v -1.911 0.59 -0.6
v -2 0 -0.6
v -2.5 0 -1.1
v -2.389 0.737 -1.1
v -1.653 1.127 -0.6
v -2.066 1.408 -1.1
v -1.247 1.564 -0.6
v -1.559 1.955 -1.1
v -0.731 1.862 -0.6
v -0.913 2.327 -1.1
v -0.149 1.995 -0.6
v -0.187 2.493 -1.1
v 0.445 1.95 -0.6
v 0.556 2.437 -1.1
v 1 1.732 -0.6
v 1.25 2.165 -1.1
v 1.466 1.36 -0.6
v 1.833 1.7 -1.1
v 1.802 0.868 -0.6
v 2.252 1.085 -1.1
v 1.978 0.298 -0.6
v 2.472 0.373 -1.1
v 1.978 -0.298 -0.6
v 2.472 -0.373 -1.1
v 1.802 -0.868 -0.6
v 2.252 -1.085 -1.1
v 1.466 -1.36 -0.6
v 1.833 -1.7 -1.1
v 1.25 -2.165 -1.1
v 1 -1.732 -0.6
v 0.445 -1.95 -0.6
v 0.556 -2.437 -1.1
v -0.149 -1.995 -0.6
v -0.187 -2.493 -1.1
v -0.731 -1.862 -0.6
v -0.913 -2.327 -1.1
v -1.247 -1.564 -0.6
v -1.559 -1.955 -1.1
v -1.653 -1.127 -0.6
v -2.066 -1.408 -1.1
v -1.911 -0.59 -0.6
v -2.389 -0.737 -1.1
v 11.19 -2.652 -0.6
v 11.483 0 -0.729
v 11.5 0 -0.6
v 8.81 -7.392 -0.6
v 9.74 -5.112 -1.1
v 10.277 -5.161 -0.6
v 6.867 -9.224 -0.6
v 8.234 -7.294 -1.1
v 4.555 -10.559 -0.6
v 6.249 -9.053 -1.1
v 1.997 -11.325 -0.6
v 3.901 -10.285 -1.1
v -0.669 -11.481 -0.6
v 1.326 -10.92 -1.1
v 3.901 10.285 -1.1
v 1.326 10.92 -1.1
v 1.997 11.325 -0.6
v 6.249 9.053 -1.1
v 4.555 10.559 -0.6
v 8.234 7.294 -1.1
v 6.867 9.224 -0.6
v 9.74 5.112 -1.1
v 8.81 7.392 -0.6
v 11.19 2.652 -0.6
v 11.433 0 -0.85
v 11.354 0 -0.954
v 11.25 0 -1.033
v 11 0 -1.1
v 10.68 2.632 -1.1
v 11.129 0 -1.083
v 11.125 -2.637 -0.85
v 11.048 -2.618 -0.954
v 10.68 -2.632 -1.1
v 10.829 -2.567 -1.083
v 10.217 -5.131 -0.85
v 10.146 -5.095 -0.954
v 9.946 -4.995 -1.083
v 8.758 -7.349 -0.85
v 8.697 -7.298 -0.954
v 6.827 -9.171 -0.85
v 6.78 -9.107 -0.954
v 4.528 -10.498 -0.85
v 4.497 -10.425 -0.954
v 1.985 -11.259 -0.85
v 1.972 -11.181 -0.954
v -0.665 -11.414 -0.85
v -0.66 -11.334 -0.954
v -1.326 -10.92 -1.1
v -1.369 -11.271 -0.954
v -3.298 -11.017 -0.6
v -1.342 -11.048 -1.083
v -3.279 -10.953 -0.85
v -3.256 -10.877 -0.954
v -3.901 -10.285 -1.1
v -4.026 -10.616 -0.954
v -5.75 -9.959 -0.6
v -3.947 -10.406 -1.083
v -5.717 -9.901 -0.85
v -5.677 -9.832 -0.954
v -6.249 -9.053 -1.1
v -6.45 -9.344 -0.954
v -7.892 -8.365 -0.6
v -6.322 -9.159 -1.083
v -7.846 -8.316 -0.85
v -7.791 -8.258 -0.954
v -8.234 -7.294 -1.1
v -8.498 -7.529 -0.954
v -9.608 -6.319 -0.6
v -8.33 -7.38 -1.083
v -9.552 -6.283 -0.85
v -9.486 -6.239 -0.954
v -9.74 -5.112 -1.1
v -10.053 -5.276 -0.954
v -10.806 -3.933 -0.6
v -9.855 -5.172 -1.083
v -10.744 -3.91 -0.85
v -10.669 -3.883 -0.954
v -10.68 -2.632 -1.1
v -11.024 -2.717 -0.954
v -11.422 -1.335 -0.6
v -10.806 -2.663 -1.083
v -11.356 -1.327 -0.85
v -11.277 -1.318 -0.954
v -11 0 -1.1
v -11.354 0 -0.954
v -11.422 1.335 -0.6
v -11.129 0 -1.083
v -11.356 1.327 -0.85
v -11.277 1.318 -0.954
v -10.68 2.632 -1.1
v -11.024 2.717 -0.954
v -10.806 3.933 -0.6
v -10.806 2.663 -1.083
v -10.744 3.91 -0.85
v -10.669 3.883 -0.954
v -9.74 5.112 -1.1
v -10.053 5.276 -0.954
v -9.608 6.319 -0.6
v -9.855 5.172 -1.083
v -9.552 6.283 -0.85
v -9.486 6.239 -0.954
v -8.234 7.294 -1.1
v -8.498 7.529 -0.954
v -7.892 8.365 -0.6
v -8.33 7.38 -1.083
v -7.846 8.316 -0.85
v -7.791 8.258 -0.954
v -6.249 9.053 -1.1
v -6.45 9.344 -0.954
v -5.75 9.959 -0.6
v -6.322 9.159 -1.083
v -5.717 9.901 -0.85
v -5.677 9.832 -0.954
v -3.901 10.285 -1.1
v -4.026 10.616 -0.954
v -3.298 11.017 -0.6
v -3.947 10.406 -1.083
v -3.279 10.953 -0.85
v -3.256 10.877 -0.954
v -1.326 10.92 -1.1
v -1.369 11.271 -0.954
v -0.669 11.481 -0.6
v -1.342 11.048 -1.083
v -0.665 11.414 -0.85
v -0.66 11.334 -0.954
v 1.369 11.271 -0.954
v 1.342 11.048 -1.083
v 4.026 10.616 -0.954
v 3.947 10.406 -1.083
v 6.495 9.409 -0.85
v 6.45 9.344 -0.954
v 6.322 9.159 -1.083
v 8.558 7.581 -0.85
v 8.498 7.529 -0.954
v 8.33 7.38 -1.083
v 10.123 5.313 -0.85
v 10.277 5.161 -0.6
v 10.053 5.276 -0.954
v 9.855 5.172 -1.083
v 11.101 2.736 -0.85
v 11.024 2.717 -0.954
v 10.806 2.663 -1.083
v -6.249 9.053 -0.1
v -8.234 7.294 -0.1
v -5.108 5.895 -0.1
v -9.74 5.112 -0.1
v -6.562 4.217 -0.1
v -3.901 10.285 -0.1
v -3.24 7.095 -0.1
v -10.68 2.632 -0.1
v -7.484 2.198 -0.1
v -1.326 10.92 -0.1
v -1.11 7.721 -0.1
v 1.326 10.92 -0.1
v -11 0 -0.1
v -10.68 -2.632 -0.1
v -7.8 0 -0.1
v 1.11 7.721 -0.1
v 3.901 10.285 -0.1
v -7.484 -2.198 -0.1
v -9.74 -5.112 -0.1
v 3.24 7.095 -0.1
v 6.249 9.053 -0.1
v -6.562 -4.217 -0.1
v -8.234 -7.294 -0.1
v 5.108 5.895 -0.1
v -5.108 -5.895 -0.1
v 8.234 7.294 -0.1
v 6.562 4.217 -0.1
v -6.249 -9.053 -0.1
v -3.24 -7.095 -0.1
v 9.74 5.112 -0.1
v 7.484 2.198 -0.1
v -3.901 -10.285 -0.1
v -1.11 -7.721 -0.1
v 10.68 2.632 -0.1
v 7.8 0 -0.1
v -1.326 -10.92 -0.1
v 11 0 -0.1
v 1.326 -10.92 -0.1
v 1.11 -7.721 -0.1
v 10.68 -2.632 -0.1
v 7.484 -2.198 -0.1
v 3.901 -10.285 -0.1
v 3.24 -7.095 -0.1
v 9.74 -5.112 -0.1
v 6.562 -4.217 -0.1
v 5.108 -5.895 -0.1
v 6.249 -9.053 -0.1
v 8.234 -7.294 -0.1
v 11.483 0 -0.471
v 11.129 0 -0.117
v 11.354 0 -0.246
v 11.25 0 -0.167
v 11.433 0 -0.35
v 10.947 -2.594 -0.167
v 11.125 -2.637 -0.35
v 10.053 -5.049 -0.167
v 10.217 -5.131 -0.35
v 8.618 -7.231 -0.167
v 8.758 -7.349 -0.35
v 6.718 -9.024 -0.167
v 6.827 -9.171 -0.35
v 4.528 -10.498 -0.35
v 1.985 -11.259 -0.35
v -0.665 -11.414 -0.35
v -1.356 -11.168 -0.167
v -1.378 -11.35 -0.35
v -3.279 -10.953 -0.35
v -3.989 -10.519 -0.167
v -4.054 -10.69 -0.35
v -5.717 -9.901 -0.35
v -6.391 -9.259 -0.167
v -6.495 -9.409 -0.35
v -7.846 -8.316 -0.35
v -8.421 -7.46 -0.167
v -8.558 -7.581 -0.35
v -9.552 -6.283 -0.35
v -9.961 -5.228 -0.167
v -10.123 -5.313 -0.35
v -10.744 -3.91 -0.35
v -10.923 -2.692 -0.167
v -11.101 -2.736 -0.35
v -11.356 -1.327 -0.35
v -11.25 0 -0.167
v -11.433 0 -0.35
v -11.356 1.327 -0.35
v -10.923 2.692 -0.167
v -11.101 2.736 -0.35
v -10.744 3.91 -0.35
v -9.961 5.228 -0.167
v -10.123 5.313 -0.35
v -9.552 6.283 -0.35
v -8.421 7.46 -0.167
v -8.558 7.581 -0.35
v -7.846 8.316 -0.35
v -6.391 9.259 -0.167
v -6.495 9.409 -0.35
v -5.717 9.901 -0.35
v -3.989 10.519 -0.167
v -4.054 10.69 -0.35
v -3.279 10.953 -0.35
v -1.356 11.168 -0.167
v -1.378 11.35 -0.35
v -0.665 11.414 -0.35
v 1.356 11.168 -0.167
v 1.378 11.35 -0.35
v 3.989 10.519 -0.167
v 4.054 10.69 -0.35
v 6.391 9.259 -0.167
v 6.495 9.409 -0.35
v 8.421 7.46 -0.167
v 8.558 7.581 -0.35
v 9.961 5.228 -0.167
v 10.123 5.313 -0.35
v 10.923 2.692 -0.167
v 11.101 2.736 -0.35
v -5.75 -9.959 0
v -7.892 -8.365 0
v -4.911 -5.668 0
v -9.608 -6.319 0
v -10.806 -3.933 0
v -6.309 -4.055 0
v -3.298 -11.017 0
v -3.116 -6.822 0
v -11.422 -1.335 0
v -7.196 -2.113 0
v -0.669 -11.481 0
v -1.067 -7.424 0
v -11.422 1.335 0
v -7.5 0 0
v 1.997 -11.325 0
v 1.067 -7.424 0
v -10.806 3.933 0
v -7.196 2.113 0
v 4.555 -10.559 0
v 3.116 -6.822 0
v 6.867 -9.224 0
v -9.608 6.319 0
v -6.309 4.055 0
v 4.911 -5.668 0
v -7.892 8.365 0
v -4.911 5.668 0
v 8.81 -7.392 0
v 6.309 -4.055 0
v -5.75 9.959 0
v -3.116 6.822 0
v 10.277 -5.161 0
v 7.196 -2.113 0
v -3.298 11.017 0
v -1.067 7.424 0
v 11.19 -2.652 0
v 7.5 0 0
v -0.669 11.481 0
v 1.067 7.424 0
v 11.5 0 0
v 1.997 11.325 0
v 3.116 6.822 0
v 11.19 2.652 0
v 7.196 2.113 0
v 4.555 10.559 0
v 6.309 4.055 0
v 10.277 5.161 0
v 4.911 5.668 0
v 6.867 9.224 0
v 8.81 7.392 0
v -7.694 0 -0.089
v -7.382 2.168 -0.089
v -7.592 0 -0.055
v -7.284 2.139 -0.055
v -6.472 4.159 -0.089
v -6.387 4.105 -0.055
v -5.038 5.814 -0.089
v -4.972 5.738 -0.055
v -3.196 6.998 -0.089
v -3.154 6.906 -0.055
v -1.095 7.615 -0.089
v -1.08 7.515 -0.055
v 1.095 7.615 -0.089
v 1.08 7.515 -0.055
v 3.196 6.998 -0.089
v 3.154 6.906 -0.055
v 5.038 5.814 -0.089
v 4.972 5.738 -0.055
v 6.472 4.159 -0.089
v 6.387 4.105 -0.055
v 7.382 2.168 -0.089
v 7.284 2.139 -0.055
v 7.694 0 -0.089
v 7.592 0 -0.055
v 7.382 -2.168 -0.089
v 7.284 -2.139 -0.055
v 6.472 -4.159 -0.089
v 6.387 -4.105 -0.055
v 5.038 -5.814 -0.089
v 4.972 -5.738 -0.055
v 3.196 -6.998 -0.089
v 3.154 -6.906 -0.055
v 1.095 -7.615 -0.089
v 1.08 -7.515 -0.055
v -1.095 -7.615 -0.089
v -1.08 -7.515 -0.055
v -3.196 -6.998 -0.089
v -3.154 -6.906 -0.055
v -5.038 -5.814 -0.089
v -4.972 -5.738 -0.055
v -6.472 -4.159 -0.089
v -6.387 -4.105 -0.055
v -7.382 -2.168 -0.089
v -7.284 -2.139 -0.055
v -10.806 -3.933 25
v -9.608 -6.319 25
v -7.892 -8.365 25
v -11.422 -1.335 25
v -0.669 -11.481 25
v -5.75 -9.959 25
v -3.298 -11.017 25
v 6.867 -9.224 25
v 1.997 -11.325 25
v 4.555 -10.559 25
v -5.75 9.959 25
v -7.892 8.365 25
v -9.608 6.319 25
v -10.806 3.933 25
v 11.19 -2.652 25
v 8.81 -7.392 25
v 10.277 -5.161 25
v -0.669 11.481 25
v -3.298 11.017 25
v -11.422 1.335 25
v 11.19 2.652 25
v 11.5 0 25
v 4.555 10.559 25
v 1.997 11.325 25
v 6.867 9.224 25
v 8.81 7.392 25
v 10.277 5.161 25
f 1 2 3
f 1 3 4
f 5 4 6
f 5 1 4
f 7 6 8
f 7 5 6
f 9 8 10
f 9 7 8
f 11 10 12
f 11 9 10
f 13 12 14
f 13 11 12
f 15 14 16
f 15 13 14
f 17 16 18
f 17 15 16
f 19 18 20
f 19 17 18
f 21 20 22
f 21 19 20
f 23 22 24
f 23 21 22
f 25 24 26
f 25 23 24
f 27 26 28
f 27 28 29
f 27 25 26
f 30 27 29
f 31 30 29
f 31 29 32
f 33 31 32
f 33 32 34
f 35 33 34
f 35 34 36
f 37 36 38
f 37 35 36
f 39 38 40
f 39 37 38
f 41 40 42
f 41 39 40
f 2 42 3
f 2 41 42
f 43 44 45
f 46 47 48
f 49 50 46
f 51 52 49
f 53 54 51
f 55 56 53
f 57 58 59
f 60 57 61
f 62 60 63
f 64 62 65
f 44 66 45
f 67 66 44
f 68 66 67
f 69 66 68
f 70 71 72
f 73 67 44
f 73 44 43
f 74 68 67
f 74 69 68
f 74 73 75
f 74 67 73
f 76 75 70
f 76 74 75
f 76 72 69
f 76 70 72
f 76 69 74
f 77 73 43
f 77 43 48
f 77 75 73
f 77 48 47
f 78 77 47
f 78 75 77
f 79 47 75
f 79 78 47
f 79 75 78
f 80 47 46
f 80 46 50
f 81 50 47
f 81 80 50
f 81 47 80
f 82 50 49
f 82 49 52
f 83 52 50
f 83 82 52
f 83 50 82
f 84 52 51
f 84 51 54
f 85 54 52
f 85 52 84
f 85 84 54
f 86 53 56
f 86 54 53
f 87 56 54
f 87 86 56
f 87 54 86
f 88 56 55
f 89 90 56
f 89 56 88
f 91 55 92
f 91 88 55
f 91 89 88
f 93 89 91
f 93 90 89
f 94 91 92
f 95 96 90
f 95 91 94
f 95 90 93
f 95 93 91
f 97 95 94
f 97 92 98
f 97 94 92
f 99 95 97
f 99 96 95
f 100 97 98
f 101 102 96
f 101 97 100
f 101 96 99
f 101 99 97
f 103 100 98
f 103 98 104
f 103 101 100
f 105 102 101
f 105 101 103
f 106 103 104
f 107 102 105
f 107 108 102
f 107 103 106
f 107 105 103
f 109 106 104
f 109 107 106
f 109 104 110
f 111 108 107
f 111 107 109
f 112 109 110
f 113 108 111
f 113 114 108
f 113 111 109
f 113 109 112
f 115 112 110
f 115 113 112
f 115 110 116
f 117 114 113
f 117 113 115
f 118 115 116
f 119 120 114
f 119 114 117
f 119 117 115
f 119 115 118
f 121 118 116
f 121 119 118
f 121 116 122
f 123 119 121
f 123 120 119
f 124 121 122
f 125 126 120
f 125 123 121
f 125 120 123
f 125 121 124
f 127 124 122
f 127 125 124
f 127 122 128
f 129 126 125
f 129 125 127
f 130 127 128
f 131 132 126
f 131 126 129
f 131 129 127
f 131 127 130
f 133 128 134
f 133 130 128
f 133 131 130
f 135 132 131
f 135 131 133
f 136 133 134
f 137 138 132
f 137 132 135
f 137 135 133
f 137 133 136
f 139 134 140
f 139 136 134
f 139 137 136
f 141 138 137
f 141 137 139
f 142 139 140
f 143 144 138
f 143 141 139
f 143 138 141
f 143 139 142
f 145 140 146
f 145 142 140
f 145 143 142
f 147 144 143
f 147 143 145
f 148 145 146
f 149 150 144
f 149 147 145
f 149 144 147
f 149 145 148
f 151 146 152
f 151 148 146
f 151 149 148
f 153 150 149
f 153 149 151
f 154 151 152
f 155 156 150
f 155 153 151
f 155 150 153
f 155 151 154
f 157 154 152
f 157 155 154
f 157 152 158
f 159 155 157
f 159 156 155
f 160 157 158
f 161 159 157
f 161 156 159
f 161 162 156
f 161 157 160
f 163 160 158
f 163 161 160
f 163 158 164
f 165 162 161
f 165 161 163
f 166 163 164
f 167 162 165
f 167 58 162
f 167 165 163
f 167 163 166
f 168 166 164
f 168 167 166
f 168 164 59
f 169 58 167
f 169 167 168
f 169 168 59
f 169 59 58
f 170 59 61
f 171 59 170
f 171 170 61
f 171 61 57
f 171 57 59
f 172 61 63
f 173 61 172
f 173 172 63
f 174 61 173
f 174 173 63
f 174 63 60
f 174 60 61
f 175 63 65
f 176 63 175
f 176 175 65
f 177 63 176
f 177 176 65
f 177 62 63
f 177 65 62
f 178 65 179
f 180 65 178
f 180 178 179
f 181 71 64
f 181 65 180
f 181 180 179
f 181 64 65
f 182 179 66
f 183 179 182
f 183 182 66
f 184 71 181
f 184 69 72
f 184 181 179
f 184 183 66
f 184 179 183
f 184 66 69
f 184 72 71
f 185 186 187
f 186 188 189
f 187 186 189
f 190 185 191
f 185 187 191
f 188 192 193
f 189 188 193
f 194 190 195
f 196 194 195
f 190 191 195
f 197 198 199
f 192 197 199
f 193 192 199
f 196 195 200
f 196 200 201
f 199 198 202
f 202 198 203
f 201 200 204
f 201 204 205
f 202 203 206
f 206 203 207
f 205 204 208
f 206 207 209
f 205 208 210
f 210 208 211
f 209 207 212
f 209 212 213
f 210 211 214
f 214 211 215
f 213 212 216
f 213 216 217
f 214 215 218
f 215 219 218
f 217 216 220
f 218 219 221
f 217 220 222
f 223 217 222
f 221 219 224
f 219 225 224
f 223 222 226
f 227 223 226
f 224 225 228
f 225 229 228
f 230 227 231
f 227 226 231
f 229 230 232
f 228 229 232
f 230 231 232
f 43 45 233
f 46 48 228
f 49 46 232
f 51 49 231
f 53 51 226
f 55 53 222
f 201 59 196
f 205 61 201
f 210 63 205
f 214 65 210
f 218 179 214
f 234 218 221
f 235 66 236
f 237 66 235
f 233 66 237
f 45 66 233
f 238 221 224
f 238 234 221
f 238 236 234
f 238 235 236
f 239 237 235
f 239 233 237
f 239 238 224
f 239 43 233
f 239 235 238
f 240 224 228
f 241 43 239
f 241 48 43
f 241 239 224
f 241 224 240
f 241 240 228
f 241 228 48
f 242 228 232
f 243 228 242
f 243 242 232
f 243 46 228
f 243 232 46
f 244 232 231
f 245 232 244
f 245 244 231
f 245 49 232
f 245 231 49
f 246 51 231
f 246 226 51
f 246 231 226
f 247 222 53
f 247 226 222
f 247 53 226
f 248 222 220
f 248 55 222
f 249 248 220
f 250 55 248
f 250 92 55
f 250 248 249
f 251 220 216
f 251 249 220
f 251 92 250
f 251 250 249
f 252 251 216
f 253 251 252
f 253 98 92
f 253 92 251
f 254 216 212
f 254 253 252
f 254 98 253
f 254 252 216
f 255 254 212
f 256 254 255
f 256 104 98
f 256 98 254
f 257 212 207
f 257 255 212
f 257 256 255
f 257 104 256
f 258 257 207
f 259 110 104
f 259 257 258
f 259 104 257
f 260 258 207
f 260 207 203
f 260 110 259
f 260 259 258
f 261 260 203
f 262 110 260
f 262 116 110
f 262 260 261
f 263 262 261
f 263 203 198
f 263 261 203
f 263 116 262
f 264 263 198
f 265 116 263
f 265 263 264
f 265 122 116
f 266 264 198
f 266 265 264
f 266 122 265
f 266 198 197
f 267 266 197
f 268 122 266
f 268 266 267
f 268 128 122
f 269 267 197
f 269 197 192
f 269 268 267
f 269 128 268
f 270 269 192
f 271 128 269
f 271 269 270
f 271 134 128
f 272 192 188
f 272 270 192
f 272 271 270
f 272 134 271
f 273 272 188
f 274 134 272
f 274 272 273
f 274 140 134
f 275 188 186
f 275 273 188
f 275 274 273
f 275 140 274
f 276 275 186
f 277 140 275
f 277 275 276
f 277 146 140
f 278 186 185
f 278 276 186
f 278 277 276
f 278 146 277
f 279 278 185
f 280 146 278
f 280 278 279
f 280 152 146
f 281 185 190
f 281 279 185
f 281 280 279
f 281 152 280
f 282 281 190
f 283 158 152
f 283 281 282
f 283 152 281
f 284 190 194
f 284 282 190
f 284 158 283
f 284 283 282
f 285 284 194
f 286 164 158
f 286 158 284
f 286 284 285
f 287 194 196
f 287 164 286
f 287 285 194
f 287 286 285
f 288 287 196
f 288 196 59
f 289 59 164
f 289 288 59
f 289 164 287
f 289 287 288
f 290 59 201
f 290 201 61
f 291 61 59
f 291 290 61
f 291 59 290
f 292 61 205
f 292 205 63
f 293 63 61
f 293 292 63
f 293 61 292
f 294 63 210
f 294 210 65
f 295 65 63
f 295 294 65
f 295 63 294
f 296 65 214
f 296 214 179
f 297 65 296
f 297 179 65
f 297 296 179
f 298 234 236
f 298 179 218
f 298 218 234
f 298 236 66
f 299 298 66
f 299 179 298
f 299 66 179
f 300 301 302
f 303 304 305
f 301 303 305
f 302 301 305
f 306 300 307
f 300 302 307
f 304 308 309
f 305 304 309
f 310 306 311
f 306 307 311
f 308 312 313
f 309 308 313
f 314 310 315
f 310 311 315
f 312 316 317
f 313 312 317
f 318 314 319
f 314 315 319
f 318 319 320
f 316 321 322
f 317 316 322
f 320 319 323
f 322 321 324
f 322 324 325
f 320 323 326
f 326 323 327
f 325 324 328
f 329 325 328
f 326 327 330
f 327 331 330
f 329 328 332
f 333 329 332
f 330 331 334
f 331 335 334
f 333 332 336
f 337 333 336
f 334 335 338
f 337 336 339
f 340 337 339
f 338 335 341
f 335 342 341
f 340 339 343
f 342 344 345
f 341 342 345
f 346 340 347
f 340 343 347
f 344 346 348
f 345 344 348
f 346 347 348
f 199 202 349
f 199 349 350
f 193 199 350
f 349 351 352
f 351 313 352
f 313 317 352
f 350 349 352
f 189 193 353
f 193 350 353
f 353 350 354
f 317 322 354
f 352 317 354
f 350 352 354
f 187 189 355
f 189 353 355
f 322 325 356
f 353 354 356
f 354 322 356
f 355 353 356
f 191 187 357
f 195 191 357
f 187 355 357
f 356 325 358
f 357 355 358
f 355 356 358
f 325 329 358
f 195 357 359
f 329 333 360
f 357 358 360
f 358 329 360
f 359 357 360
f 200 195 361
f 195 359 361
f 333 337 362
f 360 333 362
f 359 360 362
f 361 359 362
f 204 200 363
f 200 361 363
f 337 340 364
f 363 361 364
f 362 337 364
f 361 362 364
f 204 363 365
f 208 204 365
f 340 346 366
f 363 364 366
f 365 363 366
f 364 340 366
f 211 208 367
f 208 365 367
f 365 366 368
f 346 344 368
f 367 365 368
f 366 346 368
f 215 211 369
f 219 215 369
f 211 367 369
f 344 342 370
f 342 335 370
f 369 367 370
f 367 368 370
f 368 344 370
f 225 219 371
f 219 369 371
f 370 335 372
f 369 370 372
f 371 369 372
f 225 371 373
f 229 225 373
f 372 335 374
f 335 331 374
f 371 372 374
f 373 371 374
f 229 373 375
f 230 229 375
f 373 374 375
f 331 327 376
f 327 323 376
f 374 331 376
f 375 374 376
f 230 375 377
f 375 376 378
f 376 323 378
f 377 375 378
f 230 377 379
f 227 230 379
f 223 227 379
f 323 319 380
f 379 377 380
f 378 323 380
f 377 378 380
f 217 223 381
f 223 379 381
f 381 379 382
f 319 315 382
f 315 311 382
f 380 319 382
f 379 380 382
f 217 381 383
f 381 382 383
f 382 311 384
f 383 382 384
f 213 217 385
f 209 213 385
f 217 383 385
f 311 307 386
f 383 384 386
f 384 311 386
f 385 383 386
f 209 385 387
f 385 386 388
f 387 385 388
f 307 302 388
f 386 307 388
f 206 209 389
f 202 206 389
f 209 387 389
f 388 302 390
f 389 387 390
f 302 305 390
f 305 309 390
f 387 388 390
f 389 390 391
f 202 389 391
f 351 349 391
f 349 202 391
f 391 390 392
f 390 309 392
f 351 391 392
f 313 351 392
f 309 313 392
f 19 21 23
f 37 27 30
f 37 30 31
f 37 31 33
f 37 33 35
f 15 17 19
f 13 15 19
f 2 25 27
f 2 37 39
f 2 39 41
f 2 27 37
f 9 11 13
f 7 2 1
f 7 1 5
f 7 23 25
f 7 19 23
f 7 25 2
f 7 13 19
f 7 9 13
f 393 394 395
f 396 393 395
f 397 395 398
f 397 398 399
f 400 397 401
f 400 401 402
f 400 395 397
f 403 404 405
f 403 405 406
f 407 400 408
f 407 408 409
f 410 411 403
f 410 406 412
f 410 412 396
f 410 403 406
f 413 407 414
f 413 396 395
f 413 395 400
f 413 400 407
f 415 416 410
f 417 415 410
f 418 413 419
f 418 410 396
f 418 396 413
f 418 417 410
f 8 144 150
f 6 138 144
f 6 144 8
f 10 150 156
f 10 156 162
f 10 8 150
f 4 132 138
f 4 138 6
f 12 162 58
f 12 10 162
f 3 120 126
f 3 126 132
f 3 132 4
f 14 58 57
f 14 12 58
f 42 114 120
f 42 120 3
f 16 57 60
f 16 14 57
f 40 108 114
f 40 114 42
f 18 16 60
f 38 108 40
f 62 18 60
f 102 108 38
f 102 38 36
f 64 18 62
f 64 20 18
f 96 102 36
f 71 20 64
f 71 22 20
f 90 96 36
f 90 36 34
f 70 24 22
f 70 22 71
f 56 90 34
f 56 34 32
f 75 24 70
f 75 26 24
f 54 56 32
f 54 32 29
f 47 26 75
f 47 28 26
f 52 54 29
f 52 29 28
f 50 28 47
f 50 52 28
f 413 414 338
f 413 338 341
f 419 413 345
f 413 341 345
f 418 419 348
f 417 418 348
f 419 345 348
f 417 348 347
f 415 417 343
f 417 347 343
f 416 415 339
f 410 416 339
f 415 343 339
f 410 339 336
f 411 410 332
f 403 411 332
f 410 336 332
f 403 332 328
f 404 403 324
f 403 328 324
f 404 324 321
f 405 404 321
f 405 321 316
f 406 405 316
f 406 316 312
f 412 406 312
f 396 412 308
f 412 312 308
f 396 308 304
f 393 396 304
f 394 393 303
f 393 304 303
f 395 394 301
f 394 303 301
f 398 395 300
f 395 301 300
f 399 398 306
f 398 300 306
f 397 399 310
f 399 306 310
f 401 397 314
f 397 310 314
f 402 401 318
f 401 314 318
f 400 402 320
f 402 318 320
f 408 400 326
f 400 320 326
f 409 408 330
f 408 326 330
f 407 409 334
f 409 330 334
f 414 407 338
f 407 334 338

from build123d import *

# Parameters (mm, degrees)
SKETCH_1_R          = 11.5
EXTRUDE_1_DEPTH     = 25
SKETCH_2_R          = 7.5
EXTRUDE_2_DEPTH     = 0.1
EXTRUDE_START       = 1
SKETCH_3_R          = 11.5
EXTRUDE_3_DEPTH     = 1
FILLET_1_R          = 0.5
FILLET_2_R          = 0.5
SKETCH_4_R          = 2.5
CUT_EXTRUDE_1_DEPTH = 0.5
CHAMFER_1_SIZE      = 0.5


# Some blends are built 0.0001 mm under size
with BuildPart() as part:
    # 草图1 → 凸台-拉伸1 (new body)
    with BuildSketch(Plane.XY):
        Circle(SKETCH_1_R)
    extrude(amount=EXTRUDE_1_DEPTH)

    # 草图2 → 凸台-拉伸2 (add)
    with BuildSketch(Plane(origin=(0, 0, 0), x_dir=(-1, 0, 0), z_dir=(0, 0, -1))):
        Circle(SKETCH_2_R)
    extrude(amount=EXTRUDE_2_DEPTH)

    # 草图3 → 凸台-拉伸3 (add)
    with BuildSketch(Plane(origin=(0, 0, -0.1), x_dir=(-1, 0, 0), z_dir=(0, 0, -1)).offset(EXTRUDE_START)):
        with Locations(Location((0, 0, 0), (0, 0, 180))):
            Circle(SKETCH_3_R)
    extrude(amount=-EXTRUDE_3_DEPTH)

    # 圆角1
    fillet_1_edges = [part.edges().sort_by_distance(p)[0] for p in [
        (-11.5, 0, -1.1),
    ]]
    fillet(fillet_1_edges, radius=FILLET_1_R)

    # 圆角2
    # the kernel refuses this fillet: 0.5 mm, written as the material it adds along each edge
    with BuildSketch(Plane(origin=(0, 0, -0.1), x_dir=(-1, 0, 0), z_dir=(0, -1, 0))) as fillet_2_piece_1:
        with BuildLine():
            CenterArc((7.8, -0.5), FILLET_2_R, 90, 36.869897646)
            Line((7.5, -0.1), (7.5, 0))
            Line((7.5, 0), (7.8, 0))
        make_face()
    revolve(axis=Axis((0, 0, -0.1), (0, 0, -1)))
    # the kernel refuses this fillet: 0.5 mm, written as the material it takes off along each edge
    with BuildSketch(Plane(origin=(0, 0, -0.1), x_dir=(1, 0, 0), z_dir=(0, 1, 0))) as fillet_2_2_piece_1:
        with BuildLine():
            CenterArc((11.5 - FILLET_2_R, FILLET_2_R), FILLET_2_R, 270, 90)
            Line((11.5 - FILLET_2_R, 0), (11.5, 0))
            Line((11.5, 0), (11.5, FILLET_2_R))
        make_face()
    revolve(axis=Axis((0, 0, -0.1), (0, 0, -1)), mode=Mode.SUBTRACT)

    # 草图4 → 切除-拉伸1 (cut)
    with BuildSketch(Plane(origin=(0, 0, -1.1), x_dir=(-1, 0, 0), z_dir=(0, 0, -1))):
        Circle(SKETCH_4_R)
    extrude(amount=-CUT_EXTRUDE_1_DEPTH, mode=Mode.SUBTRACT)

    # 倒角1
    chamfer_1_edges = [part.edges().sort_by_distance(p)[0] for p in [
        (2.5, 0, -0.6),
    ]]
    chamfer(chamfer_1_edges, length=CHAMFER_1_SIZE - 0.0001)  # a hair under: the kernel refuses the full size


solid = part.part
